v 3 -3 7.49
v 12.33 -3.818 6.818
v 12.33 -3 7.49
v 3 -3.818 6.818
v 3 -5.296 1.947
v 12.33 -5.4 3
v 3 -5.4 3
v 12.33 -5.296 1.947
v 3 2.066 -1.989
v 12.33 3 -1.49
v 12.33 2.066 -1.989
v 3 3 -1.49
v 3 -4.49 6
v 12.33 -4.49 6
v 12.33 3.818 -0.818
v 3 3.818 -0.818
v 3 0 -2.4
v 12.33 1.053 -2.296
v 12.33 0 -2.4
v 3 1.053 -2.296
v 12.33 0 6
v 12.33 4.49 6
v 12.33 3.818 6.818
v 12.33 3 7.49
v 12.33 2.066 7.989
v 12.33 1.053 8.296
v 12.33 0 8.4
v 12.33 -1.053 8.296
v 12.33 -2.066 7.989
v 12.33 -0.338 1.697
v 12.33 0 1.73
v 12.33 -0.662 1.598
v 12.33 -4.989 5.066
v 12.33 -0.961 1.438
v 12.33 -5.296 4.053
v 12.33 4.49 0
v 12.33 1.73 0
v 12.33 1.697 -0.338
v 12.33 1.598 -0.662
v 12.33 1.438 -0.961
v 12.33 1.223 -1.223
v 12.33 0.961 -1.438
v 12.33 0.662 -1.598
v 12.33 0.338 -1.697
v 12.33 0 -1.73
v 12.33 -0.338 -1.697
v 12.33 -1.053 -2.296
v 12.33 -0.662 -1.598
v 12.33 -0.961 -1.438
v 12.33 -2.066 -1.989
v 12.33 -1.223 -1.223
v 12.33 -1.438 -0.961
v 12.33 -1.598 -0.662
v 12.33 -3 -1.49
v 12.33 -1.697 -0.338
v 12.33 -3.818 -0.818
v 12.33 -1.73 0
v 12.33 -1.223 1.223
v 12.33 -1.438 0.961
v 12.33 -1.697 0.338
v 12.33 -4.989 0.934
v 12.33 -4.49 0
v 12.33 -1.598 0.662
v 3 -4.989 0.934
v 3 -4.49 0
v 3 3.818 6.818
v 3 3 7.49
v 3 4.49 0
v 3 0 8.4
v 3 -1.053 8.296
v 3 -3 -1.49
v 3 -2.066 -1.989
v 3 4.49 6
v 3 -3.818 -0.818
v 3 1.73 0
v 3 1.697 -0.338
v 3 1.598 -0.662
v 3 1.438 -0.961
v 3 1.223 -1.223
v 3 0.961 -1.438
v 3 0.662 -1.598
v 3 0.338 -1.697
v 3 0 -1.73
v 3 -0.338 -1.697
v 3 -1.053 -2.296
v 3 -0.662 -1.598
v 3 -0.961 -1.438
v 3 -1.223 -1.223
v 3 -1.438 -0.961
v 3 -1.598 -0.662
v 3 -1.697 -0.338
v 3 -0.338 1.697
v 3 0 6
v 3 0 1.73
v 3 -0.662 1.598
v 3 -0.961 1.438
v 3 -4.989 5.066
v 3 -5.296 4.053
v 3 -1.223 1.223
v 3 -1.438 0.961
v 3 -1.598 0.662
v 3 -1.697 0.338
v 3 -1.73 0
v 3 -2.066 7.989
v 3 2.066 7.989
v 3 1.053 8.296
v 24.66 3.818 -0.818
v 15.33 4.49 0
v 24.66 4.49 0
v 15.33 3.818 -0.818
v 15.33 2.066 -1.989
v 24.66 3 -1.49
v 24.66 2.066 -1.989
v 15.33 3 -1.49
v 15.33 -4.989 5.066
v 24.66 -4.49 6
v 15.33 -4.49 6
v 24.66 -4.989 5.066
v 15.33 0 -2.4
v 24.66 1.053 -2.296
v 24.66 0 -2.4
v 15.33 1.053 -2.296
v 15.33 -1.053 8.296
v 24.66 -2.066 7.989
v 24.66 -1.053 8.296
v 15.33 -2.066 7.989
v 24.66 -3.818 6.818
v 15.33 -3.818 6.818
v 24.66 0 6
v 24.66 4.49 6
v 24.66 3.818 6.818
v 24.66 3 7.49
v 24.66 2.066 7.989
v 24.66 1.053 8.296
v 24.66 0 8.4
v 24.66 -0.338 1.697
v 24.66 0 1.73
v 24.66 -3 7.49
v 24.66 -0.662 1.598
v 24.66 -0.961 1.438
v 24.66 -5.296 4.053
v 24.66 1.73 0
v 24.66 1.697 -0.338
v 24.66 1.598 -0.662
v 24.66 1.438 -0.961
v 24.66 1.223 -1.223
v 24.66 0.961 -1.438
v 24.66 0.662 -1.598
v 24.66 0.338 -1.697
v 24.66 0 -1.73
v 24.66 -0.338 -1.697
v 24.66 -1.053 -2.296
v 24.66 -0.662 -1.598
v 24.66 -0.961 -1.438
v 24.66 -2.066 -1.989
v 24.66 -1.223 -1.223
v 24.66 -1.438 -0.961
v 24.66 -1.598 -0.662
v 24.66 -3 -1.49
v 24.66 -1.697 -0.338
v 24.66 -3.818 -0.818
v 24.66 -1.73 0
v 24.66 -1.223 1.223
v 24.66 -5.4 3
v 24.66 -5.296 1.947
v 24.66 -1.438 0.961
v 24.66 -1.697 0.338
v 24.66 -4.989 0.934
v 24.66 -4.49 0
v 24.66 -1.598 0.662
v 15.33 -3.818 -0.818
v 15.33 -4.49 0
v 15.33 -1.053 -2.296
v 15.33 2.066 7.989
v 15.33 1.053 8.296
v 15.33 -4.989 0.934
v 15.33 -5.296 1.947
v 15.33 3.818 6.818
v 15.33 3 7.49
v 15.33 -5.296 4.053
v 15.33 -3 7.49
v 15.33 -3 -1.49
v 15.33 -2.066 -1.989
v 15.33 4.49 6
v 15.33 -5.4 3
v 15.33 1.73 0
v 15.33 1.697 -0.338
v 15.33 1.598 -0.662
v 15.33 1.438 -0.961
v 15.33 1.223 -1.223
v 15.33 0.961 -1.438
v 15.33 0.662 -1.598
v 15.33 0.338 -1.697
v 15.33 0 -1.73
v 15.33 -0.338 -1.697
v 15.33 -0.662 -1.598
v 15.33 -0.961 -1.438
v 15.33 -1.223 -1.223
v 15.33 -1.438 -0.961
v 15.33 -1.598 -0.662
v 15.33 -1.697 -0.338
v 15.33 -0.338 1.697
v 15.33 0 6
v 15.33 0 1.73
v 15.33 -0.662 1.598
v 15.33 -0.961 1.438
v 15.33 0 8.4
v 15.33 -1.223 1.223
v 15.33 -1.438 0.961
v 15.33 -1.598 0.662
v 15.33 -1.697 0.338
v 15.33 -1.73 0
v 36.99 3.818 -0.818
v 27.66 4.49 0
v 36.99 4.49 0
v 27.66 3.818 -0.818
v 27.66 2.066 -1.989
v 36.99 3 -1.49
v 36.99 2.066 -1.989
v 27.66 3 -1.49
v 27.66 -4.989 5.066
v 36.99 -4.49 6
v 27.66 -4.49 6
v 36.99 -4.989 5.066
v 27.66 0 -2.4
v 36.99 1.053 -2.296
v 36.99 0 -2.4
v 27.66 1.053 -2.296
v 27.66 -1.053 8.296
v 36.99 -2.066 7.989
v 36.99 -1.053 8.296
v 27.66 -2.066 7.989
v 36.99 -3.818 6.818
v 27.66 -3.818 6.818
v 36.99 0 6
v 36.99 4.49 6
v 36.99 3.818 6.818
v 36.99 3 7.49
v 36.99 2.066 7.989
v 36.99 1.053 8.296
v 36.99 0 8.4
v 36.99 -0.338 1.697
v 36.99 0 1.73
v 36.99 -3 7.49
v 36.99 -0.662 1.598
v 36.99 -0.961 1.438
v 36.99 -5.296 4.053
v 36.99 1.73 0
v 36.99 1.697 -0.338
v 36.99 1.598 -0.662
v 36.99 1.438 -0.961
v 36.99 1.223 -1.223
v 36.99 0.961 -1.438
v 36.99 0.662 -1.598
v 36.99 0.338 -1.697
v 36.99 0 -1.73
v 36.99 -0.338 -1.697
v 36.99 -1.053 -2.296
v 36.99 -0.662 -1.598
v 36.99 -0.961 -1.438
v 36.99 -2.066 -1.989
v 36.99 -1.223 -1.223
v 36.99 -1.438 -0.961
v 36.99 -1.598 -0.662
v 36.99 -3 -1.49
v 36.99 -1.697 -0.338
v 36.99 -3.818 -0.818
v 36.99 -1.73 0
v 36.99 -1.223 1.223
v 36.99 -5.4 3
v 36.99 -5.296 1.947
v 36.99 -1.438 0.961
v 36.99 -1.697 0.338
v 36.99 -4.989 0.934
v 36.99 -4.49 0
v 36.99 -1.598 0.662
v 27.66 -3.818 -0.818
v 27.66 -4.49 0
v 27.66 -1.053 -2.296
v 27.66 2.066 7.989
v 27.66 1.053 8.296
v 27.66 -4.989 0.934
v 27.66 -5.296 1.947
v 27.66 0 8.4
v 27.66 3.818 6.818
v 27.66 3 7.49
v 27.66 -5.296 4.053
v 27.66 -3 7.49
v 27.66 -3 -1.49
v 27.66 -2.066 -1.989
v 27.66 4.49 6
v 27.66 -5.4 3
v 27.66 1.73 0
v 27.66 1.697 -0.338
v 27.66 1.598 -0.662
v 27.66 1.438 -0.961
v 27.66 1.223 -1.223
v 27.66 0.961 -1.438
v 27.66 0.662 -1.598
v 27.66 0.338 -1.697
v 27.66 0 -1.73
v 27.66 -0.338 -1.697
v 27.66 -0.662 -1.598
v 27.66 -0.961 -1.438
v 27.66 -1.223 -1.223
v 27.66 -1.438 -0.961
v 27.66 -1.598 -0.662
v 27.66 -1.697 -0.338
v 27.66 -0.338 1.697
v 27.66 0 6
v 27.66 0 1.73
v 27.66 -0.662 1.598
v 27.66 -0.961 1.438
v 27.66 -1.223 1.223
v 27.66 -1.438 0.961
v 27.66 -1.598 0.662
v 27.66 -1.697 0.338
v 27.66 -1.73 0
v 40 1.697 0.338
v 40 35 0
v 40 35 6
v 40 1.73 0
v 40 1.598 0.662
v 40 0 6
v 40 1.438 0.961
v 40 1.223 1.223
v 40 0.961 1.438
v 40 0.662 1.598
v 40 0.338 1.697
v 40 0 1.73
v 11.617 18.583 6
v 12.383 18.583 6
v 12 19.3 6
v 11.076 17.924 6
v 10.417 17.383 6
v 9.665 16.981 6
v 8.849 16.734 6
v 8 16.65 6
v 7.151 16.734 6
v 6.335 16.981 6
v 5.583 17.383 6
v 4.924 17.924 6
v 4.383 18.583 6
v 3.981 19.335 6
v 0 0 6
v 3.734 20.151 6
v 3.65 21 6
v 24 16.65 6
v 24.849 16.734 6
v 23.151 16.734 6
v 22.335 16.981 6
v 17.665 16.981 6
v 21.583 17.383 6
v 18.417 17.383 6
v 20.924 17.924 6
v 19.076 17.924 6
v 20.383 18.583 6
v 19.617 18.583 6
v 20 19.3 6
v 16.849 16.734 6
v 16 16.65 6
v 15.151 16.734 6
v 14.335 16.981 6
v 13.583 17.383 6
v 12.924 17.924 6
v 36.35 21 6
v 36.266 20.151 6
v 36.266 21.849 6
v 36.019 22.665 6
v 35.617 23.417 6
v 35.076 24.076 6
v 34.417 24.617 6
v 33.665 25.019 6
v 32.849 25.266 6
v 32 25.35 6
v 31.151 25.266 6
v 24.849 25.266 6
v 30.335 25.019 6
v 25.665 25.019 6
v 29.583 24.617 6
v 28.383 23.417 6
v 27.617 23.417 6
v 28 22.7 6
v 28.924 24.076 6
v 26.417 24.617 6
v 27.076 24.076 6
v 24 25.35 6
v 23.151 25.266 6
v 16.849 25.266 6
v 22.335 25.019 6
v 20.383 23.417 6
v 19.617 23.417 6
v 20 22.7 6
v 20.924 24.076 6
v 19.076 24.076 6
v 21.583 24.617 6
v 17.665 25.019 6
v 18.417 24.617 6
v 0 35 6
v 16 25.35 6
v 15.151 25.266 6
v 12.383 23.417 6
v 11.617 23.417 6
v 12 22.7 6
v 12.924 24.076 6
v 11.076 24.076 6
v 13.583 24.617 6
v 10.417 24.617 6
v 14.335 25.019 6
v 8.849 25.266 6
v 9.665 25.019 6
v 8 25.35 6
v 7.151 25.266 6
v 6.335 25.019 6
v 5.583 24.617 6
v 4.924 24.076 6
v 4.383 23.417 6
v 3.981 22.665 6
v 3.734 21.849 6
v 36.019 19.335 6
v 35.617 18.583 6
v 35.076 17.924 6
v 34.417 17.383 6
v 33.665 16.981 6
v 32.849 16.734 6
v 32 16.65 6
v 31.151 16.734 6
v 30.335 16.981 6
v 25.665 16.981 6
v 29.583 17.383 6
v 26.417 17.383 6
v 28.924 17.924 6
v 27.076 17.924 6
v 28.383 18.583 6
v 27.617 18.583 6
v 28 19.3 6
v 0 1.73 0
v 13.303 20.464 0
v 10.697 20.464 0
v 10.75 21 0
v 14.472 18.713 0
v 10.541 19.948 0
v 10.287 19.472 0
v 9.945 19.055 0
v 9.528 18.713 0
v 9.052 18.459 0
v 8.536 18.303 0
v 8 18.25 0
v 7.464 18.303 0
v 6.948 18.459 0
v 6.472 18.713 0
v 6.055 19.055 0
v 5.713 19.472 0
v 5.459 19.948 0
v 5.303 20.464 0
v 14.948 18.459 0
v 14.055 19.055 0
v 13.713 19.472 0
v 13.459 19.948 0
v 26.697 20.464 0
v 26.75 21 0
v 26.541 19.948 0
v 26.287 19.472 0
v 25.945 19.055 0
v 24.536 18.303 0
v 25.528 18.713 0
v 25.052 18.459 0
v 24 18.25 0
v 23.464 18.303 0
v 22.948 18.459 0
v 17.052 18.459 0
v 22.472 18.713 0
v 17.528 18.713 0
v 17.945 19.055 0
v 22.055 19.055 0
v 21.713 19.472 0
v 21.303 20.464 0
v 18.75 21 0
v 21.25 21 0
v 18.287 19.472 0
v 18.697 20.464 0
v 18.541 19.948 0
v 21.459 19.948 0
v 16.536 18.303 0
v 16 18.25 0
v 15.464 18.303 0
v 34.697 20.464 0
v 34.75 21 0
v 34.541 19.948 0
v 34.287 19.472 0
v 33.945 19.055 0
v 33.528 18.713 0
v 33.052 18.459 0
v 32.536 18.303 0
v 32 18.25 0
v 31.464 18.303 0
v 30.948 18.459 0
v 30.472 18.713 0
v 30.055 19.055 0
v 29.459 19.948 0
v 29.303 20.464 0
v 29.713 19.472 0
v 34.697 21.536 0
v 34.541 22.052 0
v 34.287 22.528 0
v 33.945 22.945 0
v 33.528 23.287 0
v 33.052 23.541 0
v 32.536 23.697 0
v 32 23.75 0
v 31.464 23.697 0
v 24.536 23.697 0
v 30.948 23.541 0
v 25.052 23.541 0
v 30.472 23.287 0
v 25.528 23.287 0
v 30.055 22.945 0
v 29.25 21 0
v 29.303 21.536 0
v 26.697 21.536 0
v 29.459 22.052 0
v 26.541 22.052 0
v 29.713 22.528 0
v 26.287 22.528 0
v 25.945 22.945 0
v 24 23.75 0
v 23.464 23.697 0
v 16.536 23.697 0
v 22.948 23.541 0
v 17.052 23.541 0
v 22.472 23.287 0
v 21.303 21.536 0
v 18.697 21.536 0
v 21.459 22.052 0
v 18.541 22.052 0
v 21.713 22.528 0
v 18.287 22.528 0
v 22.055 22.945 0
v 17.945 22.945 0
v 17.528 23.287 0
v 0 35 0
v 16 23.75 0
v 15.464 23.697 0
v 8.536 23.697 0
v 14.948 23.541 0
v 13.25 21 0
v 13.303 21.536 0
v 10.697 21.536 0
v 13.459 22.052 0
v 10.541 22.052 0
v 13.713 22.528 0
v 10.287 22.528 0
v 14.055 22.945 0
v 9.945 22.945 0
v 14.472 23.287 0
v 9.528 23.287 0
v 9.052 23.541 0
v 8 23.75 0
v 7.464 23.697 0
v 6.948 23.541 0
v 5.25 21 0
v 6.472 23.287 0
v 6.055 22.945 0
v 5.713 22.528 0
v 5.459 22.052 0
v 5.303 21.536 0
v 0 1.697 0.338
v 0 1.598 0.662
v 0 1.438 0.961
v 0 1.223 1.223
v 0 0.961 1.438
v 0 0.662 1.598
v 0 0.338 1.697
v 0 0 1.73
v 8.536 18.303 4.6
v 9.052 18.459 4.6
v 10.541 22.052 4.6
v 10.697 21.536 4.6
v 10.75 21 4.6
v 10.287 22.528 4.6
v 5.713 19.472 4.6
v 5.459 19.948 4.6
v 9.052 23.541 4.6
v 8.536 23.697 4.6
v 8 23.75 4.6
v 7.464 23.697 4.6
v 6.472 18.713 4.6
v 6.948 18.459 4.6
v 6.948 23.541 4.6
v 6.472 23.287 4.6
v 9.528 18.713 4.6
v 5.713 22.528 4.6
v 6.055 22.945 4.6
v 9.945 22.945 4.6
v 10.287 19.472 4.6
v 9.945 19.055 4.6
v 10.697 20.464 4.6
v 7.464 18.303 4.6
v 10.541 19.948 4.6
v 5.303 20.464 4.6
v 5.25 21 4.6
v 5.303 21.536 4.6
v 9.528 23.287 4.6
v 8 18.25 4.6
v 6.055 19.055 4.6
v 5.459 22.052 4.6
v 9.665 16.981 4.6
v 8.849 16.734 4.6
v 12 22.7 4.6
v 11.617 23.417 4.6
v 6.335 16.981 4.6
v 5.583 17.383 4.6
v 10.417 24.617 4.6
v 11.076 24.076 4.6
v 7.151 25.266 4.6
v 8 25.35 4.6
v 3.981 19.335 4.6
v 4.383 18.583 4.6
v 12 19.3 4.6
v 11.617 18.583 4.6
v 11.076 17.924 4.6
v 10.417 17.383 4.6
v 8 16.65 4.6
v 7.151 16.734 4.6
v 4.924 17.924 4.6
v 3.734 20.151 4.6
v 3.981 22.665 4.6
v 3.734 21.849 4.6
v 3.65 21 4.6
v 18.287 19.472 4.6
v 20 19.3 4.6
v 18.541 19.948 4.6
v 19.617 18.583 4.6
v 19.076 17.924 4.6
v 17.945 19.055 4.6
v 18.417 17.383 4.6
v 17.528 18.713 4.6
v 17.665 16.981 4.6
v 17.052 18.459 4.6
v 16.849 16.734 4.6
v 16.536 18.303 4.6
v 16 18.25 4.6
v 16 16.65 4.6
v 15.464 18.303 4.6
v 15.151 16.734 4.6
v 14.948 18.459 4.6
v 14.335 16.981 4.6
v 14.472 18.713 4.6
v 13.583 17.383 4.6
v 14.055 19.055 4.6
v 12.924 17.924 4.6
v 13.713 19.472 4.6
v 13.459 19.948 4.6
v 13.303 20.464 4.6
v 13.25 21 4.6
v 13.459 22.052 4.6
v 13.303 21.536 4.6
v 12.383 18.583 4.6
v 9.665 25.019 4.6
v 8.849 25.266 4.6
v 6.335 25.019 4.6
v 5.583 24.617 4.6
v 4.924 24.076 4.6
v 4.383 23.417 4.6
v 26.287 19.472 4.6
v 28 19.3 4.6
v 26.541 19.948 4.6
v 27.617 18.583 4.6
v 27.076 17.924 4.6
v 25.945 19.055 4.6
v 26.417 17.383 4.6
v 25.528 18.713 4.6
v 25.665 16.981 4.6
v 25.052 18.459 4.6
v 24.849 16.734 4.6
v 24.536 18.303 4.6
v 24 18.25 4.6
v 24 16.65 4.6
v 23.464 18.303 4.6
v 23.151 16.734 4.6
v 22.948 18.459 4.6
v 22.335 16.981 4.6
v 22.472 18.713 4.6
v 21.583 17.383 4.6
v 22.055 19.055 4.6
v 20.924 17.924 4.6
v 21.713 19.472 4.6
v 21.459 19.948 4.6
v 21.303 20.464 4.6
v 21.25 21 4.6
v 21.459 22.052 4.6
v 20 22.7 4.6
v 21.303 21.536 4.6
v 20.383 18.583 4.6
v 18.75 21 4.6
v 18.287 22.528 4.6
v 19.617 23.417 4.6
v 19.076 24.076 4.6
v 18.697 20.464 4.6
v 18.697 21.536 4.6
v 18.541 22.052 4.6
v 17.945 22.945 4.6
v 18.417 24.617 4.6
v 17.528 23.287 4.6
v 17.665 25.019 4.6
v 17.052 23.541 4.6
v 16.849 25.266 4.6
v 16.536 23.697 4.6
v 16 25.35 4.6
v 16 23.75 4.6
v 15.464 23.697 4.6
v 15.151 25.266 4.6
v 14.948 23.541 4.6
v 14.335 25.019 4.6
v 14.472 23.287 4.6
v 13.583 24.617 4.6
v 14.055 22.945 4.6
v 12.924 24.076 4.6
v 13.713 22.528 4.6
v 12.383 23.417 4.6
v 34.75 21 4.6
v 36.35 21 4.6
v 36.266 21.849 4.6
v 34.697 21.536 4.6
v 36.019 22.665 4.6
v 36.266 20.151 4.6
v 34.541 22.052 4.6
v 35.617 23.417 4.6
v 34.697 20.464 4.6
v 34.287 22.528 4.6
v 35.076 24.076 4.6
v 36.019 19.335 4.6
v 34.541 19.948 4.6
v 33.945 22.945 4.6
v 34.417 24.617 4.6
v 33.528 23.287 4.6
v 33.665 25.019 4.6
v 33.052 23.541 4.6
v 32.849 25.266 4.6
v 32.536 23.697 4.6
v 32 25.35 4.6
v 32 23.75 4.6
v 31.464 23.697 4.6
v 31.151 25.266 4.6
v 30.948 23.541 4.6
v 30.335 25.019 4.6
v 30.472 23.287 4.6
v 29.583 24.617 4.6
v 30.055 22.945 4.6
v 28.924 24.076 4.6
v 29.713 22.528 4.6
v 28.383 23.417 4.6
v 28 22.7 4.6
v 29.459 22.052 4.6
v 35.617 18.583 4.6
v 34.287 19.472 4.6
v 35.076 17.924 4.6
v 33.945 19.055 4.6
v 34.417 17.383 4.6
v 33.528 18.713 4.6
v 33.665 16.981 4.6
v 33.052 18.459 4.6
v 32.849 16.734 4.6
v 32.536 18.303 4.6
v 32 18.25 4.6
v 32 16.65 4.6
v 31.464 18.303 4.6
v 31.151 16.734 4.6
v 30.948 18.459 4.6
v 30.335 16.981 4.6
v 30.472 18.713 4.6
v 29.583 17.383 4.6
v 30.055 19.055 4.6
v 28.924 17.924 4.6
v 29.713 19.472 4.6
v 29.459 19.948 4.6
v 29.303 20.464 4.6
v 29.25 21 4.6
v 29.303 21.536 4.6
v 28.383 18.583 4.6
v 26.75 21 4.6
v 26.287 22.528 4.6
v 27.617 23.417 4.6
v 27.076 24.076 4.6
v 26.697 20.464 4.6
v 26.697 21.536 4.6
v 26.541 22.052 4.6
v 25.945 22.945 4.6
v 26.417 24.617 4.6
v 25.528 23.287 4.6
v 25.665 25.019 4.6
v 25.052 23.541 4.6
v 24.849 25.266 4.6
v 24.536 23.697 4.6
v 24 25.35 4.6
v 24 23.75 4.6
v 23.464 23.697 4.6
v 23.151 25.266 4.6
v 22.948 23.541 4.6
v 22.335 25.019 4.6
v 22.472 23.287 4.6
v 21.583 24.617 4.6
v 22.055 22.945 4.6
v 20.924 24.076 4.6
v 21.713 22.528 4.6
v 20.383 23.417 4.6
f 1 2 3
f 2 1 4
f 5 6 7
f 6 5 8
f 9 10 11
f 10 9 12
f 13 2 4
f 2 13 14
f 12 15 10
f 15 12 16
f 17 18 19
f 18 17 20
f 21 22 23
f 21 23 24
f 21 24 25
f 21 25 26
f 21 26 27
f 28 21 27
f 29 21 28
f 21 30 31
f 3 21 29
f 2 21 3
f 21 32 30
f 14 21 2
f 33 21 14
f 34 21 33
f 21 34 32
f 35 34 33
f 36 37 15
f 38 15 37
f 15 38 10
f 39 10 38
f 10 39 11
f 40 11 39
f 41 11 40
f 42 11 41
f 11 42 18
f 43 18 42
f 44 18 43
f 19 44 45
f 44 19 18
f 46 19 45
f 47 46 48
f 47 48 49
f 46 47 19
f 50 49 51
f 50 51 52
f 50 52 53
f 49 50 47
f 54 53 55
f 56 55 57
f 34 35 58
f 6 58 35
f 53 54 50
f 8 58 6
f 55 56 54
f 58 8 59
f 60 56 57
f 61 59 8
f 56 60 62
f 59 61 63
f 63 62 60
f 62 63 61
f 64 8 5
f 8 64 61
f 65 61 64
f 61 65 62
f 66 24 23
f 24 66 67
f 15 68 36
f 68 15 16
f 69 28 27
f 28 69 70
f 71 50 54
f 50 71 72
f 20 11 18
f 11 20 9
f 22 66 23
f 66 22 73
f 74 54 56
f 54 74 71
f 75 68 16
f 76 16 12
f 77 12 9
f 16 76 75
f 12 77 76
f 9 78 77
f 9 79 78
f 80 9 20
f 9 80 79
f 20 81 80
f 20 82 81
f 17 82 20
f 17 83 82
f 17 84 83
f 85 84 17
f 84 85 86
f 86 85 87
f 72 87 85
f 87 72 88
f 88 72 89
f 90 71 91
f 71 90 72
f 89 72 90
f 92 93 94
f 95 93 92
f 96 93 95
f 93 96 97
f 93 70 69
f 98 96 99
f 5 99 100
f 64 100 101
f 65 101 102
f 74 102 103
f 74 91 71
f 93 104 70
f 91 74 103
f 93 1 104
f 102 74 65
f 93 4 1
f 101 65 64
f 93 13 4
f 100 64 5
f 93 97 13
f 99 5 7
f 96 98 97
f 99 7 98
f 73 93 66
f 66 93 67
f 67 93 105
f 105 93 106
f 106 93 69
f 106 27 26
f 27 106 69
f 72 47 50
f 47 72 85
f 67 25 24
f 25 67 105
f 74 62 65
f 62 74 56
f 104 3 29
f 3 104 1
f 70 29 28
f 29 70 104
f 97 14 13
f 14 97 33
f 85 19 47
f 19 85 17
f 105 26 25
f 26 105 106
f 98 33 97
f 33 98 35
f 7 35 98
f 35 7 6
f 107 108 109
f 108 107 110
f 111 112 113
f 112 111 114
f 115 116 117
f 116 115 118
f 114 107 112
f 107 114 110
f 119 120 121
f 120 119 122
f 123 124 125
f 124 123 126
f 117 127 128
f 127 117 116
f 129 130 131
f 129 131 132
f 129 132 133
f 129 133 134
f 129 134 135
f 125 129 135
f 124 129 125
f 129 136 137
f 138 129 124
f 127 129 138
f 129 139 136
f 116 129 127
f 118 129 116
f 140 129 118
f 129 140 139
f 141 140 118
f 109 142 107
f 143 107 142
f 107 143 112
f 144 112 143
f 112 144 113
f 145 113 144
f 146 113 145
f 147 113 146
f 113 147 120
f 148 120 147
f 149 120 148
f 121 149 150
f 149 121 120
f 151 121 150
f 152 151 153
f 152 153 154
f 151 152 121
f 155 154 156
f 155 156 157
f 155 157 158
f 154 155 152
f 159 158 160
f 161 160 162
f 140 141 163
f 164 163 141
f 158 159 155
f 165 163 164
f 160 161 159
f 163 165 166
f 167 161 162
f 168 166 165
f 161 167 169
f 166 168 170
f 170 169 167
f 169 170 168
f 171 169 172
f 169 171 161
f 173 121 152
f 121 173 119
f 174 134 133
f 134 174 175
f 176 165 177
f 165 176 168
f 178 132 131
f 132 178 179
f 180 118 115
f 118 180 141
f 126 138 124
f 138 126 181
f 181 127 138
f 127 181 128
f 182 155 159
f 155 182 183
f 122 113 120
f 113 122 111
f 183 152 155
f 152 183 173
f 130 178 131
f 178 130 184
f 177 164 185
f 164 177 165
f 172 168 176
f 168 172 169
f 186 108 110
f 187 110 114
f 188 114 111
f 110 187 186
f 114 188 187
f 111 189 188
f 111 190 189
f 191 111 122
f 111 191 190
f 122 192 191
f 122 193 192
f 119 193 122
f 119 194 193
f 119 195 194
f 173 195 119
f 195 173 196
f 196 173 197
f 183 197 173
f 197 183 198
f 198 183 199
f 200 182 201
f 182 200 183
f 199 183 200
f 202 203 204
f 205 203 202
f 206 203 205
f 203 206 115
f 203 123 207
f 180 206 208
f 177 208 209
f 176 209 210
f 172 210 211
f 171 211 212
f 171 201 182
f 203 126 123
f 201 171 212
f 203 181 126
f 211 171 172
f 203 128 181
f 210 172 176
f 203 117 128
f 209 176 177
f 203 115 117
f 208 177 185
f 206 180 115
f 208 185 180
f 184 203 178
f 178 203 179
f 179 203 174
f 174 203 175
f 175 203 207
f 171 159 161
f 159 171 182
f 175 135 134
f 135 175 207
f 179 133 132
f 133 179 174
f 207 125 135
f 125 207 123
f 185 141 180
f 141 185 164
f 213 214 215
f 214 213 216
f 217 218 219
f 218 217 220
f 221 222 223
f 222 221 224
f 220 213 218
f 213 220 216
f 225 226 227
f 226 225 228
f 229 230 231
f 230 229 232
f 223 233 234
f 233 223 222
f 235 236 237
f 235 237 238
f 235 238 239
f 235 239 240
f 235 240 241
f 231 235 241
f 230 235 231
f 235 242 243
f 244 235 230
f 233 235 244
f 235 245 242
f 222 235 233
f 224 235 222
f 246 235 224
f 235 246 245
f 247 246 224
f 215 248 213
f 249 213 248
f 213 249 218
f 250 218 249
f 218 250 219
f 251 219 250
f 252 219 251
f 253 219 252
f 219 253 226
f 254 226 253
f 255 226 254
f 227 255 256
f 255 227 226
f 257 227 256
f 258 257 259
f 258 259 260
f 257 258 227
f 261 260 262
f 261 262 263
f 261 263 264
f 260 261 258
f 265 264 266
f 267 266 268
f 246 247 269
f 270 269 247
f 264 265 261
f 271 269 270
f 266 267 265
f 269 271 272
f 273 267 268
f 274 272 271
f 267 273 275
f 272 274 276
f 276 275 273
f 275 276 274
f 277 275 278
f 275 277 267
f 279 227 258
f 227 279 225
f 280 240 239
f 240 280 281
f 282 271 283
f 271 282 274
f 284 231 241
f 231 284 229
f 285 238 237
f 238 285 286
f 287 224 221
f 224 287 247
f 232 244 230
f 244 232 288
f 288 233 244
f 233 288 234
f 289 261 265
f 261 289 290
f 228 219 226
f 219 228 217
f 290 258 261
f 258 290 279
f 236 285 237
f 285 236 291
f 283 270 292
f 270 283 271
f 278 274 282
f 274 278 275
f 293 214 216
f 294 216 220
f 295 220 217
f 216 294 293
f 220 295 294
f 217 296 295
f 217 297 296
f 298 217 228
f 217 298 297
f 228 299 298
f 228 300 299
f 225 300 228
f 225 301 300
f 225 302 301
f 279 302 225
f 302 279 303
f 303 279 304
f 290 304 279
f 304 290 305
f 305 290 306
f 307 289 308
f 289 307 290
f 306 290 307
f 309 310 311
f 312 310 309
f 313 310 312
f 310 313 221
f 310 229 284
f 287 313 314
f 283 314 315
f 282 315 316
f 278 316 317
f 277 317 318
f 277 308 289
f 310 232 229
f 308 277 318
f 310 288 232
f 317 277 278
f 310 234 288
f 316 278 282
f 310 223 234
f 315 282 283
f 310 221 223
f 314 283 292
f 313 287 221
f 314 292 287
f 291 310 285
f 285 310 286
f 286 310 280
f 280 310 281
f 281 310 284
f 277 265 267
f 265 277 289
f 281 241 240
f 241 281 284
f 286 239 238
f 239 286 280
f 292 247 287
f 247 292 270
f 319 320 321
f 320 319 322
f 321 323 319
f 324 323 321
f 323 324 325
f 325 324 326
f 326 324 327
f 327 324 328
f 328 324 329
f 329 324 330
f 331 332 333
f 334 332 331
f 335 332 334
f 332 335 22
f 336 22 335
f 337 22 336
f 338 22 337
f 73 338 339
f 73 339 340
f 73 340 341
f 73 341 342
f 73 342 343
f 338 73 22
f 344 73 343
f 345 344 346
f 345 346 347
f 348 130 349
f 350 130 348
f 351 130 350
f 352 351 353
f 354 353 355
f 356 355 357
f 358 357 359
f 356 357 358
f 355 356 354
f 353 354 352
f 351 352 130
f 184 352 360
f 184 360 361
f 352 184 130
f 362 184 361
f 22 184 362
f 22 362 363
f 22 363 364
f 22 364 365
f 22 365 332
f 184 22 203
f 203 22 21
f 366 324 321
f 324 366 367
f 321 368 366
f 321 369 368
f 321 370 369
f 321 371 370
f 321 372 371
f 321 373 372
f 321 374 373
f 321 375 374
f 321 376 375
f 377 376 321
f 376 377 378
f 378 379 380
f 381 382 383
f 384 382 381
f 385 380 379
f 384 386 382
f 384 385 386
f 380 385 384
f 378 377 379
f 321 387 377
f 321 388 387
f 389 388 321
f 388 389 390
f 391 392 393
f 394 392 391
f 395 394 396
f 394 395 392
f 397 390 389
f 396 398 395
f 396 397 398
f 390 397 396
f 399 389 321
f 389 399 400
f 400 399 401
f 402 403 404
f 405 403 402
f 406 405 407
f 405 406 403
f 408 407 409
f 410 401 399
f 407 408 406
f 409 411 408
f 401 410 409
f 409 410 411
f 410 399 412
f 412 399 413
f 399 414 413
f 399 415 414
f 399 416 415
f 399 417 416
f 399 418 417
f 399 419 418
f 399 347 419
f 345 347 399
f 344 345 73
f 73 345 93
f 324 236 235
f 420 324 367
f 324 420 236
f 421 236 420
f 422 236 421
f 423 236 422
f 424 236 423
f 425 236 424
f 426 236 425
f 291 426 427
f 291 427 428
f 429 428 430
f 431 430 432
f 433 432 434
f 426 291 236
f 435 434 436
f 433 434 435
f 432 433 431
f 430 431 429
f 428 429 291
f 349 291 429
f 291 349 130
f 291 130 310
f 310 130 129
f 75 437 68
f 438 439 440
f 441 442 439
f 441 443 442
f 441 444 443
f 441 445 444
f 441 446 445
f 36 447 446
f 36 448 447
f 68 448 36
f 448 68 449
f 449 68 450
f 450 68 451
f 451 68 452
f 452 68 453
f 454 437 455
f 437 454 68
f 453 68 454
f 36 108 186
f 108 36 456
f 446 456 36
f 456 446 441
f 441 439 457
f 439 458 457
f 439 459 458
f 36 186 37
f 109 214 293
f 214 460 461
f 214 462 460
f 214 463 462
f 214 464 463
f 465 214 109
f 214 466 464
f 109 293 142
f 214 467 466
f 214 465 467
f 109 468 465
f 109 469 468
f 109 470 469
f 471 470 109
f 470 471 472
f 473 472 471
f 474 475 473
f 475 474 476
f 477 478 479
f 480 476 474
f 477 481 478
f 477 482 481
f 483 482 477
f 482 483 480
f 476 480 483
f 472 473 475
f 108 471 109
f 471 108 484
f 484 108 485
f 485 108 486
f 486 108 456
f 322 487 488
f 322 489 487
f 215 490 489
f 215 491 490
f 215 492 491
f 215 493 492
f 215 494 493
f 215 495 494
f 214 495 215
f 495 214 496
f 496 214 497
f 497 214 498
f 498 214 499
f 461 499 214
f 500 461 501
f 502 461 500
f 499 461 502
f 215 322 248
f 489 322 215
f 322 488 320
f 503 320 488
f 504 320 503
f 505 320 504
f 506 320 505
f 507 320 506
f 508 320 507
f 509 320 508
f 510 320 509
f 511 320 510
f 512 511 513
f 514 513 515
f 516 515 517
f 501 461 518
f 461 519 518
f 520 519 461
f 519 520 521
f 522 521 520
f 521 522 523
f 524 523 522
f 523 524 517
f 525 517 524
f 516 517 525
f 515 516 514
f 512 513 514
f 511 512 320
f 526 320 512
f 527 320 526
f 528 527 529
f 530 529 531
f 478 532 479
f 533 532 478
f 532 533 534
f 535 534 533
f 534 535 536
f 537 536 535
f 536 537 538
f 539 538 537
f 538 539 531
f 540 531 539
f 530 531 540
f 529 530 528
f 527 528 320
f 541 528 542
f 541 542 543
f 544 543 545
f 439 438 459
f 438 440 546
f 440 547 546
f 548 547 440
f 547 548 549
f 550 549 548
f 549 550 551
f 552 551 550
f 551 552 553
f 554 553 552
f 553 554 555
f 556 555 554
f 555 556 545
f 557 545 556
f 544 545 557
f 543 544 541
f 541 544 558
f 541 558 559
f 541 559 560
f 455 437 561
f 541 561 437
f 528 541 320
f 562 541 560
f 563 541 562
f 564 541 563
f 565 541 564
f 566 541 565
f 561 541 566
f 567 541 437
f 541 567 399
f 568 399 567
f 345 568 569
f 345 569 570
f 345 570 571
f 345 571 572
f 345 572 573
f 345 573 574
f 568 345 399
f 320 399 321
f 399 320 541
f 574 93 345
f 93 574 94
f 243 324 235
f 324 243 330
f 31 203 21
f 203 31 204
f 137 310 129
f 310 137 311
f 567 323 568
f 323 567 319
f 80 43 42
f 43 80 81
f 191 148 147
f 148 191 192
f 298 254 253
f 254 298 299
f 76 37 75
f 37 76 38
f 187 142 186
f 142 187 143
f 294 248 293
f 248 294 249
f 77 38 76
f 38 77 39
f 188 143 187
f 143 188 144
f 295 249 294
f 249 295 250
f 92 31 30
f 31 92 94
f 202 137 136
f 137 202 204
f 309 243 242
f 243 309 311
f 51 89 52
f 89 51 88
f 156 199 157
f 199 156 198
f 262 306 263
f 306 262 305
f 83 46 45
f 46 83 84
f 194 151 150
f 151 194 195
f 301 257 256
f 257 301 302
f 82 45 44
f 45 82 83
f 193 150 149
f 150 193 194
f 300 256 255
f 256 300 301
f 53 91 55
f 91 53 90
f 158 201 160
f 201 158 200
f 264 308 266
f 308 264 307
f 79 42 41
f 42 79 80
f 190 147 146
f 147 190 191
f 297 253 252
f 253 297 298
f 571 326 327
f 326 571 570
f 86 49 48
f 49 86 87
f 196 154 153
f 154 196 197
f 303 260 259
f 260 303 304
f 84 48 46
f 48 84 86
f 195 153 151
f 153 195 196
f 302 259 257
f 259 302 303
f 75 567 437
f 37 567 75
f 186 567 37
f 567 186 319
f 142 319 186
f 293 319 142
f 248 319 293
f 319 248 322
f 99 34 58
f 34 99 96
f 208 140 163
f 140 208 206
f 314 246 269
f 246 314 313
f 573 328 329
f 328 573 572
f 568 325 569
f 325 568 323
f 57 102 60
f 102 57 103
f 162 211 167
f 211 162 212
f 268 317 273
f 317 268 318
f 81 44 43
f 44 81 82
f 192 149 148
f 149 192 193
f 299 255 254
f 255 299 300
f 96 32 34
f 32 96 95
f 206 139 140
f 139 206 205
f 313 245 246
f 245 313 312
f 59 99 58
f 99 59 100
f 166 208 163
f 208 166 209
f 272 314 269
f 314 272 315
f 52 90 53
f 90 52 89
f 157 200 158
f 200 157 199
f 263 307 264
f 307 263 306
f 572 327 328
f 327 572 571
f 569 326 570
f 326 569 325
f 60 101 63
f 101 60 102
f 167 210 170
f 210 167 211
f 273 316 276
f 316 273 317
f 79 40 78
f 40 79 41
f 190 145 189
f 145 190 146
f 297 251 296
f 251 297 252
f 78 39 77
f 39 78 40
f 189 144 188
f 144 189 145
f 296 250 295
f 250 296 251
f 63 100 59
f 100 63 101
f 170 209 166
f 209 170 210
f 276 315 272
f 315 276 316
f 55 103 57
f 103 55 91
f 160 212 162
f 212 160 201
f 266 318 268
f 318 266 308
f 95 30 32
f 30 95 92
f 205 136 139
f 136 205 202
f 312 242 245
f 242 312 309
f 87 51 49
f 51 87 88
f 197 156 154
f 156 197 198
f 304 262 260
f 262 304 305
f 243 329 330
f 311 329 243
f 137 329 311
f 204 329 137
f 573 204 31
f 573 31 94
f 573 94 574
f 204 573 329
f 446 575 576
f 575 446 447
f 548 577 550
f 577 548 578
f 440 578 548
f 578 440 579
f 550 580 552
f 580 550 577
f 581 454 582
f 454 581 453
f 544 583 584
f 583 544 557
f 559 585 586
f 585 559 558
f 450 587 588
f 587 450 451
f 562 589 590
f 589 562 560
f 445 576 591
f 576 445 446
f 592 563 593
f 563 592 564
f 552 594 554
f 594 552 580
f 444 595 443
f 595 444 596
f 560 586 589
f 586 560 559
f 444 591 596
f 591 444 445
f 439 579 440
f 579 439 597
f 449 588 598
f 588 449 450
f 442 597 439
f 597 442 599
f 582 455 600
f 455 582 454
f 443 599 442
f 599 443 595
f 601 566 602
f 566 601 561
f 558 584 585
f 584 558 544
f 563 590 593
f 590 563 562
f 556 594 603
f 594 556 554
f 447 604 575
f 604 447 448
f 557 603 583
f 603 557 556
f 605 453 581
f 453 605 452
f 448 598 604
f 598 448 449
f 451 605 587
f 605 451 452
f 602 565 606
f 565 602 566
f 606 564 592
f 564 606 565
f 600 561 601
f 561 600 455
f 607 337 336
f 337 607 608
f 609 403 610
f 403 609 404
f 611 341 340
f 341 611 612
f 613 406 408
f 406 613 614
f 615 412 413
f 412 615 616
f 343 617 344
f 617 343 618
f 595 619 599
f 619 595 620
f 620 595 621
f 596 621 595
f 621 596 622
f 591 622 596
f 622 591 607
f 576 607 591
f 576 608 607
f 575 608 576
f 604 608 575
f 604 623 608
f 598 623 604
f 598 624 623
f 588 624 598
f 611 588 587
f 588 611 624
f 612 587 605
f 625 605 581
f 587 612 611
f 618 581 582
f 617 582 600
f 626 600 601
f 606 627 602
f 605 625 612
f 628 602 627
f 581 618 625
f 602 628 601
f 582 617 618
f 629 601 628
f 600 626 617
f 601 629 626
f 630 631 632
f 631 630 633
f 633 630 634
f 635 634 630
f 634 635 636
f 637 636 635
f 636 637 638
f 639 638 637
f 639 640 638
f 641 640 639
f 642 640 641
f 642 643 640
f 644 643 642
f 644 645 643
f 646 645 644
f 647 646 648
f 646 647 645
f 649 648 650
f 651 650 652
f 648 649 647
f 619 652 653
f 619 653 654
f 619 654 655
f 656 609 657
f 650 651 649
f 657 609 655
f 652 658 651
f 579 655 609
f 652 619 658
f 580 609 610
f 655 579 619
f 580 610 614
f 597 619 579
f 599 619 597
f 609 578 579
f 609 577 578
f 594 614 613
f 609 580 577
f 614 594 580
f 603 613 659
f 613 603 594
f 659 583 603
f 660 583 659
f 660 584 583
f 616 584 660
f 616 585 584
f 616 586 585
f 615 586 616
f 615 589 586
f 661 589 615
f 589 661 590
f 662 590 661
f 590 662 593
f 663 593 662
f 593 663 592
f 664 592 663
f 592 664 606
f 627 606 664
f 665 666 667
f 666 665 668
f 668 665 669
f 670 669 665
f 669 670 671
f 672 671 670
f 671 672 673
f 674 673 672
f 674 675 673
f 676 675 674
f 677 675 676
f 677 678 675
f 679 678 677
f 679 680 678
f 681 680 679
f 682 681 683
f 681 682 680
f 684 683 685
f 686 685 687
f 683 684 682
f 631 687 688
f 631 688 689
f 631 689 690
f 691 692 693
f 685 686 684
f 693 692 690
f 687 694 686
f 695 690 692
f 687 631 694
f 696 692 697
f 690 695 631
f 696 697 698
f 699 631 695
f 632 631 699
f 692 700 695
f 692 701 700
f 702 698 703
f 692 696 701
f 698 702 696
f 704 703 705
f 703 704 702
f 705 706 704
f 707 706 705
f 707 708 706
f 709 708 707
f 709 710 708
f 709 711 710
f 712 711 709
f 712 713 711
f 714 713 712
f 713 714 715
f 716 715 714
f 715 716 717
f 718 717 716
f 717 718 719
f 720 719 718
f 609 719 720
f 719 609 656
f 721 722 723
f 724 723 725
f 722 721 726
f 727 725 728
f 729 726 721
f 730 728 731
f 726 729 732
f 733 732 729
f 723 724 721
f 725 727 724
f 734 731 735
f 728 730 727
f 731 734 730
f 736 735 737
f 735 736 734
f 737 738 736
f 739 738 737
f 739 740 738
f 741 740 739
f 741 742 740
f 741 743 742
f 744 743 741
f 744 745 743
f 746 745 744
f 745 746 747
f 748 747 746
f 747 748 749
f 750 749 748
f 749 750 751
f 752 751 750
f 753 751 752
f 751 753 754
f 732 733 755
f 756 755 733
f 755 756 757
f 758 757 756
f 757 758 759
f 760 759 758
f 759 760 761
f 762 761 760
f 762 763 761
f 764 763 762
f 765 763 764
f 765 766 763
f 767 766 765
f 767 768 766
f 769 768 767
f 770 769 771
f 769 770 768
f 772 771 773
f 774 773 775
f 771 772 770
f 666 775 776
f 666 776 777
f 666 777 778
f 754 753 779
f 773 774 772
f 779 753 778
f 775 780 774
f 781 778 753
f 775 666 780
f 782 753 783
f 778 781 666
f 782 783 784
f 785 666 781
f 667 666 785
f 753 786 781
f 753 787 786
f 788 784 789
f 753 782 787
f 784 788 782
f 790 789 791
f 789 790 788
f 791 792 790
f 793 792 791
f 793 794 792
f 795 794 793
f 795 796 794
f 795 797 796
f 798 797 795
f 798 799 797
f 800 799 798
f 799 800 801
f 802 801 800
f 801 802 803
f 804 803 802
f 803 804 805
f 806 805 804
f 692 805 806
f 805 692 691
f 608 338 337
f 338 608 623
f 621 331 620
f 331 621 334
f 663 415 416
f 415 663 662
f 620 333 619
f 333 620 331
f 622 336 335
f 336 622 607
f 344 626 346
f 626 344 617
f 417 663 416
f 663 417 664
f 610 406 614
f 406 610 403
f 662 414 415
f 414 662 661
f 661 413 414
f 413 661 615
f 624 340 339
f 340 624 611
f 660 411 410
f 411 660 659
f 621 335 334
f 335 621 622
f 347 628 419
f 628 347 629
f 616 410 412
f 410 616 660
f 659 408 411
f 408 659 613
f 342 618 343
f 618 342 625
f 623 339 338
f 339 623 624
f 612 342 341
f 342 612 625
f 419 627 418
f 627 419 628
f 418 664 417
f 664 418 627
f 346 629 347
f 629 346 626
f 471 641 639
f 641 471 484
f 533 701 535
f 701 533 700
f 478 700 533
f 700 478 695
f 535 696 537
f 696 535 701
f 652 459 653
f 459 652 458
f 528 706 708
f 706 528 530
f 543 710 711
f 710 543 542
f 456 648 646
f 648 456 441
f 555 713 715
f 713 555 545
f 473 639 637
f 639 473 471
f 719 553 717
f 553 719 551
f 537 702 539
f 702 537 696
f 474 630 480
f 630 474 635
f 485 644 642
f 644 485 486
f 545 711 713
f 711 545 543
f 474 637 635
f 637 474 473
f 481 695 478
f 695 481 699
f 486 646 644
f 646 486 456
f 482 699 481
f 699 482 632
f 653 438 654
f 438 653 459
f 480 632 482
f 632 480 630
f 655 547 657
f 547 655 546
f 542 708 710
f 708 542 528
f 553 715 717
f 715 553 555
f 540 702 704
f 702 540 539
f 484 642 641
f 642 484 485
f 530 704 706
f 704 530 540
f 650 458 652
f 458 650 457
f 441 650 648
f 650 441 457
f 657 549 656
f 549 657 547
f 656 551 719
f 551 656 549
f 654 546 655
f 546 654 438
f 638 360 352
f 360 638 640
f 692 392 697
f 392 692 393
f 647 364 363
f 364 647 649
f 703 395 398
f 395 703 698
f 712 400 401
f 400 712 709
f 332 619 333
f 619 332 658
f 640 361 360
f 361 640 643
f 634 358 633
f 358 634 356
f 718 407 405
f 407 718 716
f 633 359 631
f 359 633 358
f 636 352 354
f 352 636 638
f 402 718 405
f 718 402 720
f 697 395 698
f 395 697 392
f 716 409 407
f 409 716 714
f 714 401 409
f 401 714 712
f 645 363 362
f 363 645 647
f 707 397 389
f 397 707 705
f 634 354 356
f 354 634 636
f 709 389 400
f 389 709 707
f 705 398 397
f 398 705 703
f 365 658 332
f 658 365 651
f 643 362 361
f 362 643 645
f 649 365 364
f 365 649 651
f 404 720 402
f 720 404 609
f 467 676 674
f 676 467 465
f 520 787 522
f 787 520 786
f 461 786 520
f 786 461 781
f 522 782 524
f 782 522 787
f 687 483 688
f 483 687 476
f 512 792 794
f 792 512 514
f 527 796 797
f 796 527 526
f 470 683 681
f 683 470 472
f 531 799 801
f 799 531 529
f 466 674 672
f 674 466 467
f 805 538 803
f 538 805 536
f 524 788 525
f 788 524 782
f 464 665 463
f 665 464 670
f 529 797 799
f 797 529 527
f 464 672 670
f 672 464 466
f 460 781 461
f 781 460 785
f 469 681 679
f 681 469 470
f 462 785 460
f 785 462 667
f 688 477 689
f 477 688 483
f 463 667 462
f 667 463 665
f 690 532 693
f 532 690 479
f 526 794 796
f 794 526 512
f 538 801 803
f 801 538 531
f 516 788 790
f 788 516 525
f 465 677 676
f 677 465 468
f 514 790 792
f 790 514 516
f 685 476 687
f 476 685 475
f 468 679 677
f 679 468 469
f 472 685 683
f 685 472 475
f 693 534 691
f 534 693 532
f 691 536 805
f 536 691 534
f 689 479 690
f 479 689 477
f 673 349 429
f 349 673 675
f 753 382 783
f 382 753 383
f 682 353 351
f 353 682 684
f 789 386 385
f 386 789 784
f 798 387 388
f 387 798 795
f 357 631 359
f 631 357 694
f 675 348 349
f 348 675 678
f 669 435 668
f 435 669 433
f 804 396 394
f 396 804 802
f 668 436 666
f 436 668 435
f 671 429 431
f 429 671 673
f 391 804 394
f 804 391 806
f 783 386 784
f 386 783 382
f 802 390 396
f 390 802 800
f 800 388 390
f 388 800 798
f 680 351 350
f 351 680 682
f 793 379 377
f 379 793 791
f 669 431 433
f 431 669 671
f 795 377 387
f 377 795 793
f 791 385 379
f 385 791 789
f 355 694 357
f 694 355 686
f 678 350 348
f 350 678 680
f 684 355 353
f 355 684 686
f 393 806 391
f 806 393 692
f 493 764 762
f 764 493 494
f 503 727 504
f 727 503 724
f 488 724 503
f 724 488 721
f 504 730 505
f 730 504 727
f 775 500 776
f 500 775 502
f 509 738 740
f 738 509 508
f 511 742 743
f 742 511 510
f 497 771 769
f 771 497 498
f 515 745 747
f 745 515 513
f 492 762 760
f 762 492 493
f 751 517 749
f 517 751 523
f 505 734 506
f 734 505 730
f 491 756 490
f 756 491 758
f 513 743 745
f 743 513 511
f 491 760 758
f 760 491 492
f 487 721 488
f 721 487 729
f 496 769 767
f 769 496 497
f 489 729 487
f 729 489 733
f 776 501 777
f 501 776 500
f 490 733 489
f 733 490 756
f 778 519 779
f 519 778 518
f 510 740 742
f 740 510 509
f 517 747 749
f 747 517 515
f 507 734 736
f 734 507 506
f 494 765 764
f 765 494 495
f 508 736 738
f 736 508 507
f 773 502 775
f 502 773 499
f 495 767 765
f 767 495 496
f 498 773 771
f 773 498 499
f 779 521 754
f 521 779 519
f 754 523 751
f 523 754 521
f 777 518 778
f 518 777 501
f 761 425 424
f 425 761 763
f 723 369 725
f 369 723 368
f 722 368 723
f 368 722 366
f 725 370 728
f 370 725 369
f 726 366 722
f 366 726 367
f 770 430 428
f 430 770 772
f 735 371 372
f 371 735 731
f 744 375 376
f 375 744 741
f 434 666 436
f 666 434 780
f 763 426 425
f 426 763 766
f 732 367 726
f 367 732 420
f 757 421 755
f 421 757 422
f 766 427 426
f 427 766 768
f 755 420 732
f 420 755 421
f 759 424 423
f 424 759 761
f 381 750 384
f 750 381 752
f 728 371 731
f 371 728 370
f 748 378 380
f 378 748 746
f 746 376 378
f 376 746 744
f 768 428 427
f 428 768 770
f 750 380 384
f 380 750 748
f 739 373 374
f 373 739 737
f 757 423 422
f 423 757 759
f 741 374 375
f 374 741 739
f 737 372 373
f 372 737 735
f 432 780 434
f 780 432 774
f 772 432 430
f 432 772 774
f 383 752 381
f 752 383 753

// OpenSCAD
$fn = 32;

// ----------------------------------------------------------------------
// Hinge leaf: 40 x 40.4 x 10.8 mm
// ----------------------------------------------------------------------

// --- parameters (mm) ---
plate_len = 40;           // leaf length, X
plate_w = 35;             // leaf width, Y
plate_t = 6;              // leaf thickness
barrel_d = 10.8;          // knuckle diameter
barrel_w = 9.33;          // knuckle width
knuckle_n = 3;            // number of knuckles
pin_d = 3.46;             // pin bore
gap = 3;                  // gap between the knuckles
screw_d = 5.5;            // screw clearance
cs_d = 8.7;               // countersink diameter
cs_h = 1.4;               // countersink depth

module leaf() {
  cube([plate_len, plate_w, plate_t]);
}

module knuckles() {
  /* barrels sit on the leaf edge, the pin axis at half the leaf thickness */
  for (i = [0 : knuckle_n - 1])
    translate([gap + i * (barrel_w + gap), 0, plate_t * 0.5])
      rotate([0, 90, 0]) cylinder(h = barrel_w, d = barrel_d);
}

difference() {
  union() {
    leaf();
    knuckles();
  }
  rotate([0, 90, 0]) translate([0, 0, -1])
    cylinder(h = plate_len + 2, d = pin_d);
  translate([8, plate_w * 0.6, -1]) cylinder(h = plate_t + 2, d = screw_d);
  translate([8, plate_w * 0.6, plate_t - cs_h]) cylinder(h = cs_h + 0.5, d = cs_d);
  translate([16, plate_w * 0.6, -1]) cylinder(h = plate_t + 2, d = screw_d);
  translate([16, plate_w * 0.6, plate_t - cs_h]) cylinder(h = cs_h + 0.5, d = cs_d);
  translate([24, plate_w * 0.6, -1]) cylinder(h = plate_t + 2, d = screw_d);
  translate([24, plate_w * 0.6, plate_t - cs_h]) cylinder(h = cs_h + 0.5, d = cs_d);
  translate([32, plate_w * 0.6, -1]) cylinder(h = plate_t + 2, d = screw_d);
  translate([32, plate_w * 0.6, plate_t - cs_h]) cylinder(h = cs_h + 0.5, d = cs_d);
}
